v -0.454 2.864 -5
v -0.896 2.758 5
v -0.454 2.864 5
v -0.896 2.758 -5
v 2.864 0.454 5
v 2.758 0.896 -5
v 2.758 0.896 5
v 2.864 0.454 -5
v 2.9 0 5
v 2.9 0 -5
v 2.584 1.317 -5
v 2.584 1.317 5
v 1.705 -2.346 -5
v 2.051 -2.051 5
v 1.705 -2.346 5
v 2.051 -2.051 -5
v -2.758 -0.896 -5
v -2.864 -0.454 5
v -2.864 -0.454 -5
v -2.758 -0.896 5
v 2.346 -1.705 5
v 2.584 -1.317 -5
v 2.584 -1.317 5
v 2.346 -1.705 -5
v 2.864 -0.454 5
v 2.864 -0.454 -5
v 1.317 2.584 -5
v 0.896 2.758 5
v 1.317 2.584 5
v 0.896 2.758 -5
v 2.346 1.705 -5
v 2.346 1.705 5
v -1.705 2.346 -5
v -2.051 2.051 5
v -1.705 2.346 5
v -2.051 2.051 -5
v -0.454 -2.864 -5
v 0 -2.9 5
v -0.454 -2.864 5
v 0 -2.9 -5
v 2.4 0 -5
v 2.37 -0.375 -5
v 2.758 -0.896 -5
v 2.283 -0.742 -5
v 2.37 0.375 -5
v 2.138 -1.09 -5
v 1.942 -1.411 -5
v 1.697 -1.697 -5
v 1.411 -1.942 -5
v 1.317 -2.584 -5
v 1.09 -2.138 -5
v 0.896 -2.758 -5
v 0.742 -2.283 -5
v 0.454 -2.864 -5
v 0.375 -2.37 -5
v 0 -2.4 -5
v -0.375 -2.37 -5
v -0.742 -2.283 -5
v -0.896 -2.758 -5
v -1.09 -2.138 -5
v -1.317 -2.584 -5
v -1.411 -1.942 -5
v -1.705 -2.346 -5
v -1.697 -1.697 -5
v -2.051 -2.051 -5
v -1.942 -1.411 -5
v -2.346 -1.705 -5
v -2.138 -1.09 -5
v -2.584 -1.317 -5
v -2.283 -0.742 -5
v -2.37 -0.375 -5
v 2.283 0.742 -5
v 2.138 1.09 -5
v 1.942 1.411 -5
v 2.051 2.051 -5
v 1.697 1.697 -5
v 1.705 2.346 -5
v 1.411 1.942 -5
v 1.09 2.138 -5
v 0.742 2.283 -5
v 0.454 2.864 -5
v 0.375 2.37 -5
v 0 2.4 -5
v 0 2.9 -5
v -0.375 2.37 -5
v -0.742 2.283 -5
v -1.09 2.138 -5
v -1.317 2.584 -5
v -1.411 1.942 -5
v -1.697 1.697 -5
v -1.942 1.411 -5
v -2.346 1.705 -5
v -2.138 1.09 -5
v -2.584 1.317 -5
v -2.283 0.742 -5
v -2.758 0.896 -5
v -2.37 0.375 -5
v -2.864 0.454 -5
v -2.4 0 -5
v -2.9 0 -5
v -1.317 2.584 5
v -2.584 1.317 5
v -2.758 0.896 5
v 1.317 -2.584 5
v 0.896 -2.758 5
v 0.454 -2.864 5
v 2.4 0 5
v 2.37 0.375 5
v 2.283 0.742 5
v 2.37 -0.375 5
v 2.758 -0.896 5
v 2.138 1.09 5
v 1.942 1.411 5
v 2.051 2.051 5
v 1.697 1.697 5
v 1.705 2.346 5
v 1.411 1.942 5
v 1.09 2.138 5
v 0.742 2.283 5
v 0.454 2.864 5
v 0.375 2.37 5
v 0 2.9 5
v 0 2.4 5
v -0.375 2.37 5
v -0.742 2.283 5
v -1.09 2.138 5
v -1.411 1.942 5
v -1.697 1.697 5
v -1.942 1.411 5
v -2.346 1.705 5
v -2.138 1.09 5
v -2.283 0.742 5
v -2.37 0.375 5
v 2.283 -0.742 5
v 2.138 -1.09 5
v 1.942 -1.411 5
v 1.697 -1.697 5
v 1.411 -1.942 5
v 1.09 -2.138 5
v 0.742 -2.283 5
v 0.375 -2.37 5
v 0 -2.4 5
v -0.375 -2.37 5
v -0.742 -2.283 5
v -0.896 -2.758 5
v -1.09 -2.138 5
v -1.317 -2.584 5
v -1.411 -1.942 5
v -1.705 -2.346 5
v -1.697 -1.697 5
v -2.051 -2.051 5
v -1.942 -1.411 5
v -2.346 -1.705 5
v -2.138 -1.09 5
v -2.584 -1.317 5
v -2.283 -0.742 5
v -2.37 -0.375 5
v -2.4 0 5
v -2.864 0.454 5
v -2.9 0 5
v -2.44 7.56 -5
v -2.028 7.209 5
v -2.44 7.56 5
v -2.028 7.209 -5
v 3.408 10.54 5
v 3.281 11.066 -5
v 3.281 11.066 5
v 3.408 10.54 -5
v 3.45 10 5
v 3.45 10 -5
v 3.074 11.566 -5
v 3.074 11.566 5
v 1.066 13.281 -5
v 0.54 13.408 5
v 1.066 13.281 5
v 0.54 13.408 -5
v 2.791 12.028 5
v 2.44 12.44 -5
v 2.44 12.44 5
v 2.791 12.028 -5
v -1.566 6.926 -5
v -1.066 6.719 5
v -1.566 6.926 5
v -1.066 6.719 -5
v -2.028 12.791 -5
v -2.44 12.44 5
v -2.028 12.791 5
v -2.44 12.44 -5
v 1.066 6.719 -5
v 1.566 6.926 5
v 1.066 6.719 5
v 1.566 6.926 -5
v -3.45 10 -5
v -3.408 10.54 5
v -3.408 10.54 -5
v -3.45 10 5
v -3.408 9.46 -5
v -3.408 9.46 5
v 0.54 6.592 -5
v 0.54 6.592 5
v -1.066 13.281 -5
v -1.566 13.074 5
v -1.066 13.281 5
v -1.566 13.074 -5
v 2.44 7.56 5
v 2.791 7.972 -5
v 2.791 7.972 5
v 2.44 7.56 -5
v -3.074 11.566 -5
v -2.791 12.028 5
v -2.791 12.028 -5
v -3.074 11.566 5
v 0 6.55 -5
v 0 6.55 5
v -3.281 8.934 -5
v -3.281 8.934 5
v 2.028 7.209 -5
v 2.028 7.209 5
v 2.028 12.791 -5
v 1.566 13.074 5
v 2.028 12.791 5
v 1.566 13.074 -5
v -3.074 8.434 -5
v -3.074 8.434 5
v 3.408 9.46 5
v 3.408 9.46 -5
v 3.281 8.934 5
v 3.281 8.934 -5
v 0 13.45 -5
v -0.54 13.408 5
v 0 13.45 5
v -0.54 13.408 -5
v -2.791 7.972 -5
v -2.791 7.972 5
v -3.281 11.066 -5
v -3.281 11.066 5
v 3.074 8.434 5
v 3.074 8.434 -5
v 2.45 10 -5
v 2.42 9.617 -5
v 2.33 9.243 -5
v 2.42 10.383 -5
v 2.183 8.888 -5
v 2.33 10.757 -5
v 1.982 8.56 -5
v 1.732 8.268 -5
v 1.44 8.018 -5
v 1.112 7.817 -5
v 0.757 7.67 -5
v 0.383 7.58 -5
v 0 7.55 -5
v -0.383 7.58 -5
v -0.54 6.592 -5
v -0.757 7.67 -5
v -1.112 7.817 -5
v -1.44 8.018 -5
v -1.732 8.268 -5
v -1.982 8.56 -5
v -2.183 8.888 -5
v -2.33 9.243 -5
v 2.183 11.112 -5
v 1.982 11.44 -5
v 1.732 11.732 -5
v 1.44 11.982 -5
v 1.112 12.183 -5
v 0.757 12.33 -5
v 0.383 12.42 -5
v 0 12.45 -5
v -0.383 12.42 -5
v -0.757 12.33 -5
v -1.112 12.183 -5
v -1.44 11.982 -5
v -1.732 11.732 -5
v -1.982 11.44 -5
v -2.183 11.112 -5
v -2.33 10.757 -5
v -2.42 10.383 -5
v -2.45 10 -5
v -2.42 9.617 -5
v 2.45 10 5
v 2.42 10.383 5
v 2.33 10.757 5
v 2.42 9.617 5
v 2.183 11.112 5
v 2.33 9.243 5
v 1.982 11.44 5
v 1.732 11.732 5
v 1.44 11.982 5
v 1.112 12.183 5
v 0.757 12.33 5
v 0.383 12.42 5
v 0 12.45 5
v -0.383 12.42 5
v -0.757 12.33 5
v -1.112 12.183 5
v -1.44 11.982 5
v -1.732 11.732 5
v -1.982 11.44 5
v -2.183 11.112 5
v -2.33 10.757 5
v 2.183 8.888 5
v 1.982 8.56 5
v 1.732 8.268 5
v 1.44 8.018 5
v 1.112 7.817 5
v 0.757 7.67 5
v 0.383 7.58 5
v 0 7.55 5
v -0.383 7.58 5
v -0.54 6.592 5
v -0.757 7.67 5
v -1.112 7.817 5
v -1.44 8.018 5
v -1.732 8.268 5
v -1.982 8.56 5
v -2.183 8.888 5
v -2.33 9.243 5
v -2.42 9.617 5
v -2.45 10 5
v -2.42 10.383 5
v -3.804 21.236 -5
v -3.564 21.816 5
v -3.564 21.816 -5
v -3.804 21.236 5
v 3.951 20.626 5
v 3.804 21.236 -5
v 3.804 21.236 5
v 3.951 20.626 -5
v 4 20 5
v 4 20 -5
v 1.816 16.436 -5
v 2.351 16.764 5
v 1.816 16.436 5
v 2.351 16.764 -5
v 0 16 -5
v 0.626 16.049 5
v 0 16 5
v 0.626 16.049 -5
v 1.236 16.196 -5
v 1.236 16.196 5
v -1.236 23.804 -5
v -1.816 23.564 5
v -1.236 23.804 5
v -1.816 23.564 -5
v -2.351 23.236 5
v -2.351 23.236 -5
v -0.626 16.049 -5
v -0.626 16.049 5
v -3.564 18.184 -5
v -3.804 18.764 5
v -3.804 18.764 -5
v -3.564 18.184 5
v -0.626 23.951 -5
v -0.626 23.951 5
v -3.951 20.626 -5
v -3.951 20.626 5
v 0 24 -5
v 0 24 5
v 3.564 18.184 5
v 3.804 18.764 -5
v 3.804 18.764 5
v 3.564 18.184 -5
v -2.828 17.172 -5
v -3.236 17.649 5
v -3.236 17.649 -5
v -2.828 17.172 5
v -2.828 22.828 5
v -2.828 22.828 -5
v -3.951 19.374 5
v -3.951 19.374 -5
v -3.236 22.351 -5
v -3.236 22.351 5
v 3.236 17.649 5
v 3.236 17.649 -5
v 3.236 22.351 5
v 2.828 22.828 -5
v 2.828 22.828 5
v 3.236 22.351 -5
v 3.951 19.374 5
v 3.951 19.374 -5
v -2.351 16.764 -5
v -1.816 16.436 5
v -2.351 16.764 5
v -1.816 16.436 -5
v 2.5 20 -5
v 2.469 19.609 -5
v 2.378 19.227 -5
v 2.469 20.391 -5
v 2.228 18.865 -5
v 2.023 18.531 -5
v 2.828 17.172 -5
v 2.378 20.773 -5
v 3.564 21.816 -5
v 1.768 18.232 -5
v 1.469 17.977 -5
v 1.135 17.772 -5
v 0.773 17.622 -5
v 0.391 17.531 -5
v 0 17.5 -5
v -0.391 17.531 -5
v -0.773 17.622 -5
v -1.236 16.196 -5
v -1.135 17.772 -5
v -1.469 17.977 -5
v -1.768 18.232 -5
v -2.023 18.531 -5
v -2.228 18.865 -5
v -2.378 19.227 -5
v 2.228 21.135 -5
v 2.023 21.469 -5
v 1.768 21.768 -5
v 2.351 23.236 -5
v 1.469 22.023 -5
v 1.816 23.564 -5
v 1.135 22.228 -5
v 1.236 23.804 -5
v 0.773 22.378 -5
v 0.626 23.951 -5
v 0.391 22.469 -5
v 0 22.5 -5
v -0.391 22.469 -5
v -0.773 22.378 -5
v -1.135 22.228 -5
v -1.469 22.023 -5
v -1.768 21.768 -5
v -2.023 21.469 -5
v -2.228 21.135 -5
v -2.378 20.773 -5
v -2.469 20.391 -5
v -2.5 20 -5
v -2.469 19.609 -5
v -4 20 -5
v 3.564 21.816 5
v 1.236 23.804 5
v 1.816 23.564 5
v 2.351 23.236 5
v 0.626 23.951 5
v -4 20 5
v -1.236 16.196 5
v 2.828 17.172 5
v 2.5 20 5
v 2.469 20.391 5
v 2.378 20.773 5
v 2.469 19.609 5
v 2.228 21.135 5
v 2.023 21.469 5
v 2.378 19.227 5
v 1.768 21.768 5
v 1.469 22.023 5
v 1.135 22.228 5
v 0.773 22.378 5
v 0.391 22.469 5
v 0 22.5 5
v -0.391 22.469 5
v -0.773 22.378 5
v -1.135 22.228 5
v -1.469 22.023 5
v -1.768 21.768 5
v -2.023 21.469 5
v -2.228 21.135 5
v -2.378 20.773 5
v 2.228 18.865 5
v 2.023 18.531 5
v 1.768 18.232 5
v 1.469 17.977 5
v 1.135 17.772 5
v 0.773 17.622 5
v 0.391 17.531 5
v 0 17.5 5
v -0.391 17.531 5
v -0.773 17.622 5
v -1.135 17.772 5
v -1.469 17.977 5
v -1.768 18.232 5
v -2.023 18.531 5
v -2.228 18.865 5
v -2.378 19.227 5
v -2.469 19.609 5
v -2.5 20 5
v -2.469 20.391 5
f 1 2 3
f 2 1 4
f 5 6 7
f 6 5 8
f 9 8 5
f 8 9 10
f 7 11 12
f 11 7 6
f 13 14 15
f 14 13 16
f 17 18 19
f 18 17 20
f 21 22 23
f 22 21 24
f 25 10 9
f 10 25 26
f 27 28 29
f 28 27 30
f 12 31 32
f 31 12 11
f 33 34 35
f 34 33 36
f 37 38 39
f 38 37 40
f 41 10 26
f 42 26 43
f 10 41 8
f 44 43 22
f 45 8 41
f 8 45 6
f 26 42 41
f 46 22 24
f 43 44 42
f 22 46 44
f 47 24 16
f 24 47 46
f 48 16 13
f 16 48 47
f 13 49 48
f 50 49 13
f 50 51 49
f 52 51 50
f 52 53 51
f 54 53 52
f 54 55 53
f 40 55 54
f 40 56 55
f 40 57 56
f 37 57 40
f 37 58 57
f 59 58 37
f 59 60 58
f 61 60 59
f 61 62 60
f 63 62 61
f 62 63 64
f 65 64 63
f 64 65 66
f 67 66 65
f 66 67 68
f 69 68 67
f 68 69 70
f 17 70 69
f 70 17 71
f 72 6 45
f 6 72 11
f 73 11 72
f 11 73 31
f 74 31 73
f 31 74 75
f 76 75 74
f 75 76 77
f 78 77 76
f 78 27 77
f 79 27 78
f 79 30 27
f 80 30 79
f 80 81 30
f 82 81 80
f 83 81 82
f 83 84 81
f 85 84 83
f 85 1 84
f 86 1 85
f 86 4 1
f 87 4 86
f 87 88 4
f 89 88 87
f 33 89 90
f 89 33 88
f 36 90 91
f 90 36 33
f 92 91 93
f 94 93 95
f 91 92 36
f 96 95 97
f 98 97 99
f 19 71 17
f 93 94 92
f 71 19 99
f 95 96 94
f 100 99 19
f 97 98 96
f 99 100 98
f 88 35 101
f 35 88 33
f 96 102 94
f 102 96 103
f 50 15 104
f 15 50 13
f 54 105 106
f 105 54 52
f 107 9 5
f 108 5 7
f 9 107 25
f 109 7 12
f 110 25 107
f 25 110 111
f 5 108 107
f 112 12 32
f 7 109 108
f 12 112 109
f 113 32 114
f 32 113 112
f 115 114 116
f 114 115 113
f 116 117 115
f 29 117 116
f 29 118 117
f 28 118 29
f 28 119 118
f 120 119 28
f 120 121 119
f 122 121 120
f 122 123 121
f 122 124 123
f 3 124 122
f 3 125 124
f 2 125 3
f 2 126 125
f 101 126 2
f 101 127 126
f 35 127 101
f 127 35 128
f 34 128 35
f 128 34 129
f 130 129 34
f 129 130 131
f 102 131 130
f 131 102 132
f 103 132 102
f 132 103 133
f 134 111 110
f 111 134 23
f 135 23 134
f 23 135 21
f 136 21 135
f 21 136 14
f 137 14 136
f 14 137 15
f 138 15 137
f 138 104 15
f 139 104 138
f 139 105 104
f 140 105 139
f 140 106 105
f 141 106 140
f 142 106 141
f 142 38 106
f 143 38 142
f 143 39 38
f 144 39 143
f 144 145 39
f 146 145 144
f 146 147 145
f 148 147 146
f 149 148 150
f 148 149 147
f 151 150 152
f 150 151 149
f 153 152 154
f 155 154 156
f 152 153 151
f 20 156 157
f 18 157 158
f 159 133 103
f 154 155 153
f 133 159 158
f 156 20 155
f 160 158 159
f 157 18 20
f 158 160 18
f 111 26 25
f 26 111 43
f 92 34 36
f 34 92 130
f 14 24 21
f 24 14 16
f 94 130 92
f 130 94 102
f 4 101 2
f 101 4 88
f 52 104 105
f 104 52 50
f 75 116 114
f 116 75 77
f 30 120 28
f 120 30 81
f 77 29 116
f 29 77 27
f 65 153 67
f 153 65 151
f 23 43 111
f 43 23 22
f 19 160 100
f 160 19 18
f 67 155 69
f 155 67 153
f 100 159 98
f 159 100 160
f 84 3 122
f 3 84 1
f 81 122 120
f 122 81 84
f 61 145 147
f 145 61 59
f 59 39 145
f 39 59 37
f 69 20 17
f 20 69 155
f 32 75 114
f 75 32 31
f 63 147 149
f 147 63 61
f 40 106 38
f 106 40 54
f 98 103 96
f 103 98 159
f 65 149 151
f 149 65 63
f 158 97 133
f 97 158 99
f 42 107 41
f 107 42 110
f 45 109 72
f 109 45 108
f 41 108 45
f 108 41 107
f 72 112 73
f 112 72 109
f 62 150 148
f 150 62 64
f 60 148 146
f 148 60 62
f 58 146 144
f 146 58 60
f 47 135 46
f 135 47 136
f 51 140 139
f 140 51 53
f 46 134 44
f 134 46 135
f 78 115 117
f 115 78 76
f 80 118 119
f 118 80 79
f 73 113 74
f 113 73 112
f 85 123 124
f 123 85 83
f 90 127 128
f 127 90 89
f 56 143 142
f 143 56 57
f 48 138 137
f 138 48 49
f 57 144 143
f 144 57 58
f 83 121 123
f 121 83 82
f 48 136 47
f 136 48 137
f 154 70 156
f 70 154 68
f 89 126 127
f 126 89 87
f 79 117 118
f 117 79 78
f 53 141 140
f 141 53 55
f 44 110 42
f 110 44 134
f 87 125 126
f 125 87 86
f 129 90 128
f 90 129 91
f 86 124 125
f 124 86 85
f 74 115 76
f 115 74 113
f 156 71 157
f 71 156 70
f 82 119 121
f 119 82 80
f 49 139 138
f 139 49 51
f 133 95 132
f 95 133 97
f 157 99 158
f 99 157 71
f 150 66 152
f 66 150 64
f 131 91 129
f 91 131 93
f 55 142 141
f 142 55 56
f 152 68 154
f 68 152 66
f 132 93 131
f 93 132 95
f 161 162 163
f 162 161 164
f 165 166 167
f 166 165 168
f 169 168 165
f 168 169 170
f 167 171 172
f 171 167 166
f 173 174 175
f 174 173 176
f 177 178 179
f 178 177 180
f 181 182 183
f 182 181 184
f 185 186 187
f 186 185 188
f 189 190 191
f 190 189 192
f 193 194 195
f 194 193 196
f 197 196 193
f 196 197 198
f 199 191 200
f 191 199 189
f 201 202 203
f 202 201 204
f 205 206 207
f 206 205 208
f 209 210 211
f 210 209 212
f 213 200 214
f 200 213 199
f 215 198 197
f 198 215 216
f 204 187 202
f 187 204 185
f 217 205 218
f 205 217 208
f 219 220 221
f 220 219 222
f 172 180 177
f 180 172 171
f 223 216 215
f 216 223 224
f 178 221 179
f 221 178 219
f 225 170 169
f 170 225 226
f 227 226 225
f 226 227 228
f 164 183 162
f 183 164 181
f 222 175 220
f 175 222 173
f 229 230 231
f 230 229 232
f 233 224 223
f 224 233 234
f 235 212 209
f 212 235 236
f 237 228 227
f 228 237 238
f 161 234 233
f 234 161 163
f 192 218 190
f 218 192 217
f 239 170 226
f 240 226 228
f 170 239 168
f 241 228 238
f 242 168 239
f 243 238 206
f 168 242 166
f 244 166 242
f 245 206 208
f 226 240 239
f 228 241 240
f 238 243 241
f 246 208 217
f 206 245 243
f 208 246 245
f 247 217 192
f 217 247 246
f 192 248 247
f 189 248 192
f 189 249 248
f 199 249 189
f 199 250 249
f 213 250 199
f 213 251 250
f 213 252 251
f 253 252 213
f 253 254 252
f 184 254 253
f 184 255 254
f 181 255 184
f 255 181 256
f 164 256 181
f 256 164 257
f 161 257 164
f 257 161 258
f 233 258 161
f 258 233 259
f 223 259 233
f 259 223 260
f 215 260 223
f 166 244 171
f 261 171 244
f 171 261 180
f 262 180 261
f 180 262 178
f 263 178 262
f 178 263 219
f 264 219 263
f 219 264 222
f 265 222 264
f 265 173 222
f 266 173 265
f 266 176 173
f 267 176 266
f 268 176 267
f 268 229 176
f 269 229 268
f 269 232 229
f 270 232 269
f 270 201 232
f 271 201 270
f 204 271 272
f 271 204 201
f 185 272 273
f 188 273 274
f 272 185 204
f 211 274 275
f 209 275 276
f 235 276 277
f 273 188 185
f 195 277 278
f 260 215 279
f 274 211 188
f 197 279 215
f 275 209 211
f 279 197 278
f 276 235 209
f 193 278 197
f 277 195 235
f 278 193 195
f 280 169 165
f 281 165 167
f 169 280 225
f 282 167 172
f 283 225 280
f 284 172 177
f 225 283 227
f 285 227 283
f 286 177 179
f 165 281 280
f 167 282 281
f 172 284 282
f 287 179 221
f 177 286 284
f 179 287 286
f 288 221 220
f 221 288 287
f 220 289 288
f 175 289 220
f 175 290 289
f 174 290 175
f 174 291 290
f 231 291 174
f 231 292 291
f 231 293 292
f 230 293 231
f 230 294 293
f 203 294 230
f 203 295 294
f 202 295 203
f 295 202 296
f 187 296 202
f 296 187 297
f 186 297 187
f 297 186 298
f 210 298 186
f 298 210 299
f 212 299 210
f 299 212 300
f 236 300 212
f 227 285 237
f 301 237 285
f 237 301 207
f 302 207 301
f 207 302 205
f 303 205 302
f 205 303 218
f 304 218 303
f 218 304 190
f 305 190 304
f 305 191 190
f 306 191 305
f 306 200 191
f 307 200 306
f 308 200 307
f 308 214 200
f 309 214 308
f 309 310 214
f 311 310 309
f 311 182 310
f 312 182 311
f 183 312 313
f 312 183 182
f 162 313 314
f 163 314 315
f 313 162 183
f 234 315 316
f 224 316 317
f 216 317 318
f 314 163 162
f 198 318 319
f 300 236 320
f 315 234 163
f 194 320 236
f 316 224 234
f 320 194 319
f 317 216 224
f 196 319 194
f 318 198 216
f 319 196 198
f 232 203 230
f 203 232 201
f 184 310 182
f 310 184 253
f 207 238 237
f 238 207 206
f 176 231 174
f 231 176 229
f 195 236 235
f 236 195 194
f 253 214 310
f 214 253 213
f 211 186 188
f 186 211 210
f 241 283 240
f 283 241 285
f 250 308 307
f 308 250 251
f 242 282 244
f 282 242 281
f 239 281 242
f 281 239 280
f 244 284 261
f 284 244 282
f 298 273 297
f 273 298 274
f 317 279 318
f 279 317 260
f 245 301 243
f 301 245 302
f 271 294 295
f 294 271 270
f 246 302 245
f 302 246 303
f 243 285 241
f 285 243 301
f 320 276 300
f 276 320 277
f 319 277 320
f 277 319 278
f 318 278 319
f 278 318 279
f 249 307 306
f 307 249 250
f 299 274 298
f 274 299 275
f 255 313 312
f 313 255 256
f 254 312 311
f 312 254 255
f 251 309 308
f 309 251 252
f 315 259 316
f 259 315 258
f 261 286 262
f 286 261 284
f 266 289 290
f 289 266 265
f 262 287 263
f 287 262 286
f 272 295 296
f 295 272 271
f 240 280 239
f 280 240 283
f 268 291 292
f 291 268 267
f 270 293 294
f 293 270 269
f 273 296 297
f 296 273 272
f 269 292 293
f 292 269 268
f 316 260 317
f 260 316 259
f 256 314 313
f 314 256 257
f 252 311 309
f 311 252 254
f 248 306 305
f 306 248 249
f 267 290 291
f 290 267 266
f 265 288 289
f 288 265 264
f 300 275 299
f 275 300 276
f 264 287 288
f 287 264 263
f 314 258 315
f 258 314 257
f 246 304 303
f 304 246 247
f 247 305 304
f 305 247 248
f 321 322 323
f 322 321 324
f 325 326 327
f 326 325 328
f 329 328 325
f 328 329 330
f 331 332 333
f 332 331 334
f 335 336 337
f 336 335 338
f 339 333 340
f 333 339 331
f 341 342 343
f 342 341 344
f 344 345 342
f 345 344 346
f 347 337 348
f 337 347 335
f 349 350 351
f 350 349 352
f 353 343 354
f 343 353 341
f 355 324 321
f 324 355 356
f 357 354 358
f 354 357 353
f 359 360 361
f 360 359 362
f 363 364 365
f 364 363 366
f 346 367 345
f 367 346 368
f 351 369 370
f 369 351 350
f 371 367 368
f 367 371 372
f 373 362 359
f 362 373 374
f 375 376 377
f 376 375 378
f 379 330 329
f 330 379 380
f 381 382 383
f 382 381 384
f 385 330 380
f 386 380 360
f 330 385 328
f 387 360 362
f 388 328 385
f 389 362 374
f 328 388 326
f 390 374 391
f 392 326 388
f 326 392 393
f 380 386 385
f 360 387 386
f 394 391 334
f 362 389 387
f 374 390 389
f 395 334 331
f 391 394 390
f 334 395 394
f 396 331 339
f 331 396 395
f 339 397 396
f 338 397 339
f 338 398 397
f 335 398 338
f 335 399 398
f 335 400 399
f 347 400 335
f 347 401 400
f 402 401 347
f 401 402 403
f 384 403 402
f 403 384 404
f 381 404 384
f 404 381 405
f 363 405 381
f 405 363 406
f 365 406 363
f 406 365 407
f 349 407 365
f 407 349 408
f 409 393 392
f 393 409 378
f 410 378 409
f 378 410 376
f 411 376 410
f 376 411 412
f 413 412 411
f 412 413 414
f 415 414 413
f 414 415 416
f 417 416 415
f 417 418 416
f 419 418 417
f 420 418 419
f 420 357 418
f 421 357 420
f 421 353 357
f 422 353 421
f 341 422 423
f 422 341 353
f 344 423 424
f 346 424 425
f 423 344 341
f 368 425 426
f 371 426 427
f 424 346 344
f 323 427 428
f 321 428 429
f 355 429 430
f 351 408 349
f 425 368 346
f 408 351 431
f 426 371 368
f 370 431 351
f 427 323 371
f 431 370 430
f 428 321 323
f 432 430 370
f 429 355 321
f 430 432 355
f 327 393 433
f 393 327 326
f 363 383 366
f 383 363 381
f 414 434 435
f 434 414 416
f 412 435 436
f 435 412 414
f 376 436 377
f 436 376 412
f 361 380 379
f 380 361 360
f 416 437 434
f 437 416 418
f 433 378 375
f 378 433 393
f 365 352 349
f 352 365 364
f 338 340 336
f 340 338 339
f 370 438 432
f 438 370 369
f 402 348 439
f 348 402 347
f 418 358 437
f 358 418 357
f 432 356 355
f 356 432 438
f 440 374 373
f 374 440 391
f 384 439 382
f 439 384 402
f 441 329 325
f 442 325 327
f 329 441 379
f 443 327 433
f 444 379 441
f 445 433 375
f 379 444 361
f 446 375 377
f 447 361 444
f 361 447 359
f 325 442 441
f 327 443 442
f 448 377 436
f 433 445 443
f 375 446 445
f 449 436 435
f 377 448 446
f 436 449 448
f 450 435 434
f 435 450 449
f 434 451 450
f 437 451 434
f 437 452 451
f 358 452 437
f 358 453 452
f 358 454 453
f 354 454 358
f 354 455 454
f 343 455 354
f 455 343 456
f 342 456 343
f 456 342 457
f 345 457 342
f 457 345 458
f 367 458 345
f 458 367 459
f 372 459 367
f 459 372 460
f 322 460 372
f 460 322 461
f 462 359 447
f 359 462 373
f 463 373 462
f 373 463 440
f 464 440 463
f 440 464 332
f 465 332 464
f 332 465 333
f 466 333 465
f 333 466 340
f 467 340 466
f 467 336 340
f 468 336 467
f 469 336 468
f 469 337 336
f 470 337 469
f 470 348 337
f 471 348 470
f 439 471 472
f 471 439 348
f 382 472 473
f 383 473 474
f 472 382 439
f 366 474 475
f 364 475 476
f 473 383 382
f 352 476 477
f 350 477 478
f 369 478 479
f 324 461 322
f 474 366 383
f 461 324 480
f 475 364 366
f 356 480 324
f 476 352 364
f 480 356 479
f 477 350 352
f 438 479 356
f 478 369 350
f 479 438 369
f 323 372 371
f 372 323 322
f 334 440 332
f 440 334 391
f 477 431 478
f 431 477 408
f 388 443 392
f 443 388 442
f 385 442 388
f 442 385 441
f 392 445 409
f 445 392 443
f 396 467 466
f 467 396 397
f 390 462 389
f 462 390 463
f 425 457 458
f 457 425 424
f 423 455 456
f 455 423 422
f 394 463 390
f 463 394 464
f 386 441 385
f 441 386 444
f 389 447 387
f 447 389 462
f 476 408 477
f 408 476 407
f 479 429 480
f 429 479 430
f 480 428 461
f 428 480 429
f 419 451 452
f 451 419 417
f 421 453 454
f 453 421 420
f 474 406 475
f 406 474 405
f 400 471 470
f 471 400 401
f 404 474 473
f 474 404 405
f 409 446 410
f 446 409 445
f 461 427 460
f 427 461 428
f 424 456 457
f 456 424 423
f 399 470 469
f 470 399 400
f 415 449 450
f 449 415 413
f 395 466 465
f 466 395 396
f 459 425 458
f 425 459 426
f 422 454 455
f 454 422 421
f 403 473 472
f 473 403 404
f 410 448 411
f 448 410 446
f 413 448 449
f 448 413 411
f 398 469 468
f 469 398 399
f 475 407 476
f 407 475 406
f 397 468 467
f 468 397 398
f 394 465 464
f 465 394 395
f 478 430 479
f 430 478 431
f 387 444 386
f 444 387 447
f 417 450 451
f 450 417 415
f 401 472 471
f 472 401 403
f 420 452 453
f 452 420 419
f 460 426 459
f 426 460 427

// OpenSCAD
module tube(height, diameter, thickness)
{
    difference() {
        cylinder(h = height, d = diameter+thickness, center = true, $fn = 40);
        cylinder(h = height+0.1, d = diameter, center = true, $fn = 40);
    }
}

tube(10, 4.8, 1);

translate([0, 10, 0])
tube(10, 4.9, 2);

translate([0, 20, 0])
tube(10, 5.0, 3);
